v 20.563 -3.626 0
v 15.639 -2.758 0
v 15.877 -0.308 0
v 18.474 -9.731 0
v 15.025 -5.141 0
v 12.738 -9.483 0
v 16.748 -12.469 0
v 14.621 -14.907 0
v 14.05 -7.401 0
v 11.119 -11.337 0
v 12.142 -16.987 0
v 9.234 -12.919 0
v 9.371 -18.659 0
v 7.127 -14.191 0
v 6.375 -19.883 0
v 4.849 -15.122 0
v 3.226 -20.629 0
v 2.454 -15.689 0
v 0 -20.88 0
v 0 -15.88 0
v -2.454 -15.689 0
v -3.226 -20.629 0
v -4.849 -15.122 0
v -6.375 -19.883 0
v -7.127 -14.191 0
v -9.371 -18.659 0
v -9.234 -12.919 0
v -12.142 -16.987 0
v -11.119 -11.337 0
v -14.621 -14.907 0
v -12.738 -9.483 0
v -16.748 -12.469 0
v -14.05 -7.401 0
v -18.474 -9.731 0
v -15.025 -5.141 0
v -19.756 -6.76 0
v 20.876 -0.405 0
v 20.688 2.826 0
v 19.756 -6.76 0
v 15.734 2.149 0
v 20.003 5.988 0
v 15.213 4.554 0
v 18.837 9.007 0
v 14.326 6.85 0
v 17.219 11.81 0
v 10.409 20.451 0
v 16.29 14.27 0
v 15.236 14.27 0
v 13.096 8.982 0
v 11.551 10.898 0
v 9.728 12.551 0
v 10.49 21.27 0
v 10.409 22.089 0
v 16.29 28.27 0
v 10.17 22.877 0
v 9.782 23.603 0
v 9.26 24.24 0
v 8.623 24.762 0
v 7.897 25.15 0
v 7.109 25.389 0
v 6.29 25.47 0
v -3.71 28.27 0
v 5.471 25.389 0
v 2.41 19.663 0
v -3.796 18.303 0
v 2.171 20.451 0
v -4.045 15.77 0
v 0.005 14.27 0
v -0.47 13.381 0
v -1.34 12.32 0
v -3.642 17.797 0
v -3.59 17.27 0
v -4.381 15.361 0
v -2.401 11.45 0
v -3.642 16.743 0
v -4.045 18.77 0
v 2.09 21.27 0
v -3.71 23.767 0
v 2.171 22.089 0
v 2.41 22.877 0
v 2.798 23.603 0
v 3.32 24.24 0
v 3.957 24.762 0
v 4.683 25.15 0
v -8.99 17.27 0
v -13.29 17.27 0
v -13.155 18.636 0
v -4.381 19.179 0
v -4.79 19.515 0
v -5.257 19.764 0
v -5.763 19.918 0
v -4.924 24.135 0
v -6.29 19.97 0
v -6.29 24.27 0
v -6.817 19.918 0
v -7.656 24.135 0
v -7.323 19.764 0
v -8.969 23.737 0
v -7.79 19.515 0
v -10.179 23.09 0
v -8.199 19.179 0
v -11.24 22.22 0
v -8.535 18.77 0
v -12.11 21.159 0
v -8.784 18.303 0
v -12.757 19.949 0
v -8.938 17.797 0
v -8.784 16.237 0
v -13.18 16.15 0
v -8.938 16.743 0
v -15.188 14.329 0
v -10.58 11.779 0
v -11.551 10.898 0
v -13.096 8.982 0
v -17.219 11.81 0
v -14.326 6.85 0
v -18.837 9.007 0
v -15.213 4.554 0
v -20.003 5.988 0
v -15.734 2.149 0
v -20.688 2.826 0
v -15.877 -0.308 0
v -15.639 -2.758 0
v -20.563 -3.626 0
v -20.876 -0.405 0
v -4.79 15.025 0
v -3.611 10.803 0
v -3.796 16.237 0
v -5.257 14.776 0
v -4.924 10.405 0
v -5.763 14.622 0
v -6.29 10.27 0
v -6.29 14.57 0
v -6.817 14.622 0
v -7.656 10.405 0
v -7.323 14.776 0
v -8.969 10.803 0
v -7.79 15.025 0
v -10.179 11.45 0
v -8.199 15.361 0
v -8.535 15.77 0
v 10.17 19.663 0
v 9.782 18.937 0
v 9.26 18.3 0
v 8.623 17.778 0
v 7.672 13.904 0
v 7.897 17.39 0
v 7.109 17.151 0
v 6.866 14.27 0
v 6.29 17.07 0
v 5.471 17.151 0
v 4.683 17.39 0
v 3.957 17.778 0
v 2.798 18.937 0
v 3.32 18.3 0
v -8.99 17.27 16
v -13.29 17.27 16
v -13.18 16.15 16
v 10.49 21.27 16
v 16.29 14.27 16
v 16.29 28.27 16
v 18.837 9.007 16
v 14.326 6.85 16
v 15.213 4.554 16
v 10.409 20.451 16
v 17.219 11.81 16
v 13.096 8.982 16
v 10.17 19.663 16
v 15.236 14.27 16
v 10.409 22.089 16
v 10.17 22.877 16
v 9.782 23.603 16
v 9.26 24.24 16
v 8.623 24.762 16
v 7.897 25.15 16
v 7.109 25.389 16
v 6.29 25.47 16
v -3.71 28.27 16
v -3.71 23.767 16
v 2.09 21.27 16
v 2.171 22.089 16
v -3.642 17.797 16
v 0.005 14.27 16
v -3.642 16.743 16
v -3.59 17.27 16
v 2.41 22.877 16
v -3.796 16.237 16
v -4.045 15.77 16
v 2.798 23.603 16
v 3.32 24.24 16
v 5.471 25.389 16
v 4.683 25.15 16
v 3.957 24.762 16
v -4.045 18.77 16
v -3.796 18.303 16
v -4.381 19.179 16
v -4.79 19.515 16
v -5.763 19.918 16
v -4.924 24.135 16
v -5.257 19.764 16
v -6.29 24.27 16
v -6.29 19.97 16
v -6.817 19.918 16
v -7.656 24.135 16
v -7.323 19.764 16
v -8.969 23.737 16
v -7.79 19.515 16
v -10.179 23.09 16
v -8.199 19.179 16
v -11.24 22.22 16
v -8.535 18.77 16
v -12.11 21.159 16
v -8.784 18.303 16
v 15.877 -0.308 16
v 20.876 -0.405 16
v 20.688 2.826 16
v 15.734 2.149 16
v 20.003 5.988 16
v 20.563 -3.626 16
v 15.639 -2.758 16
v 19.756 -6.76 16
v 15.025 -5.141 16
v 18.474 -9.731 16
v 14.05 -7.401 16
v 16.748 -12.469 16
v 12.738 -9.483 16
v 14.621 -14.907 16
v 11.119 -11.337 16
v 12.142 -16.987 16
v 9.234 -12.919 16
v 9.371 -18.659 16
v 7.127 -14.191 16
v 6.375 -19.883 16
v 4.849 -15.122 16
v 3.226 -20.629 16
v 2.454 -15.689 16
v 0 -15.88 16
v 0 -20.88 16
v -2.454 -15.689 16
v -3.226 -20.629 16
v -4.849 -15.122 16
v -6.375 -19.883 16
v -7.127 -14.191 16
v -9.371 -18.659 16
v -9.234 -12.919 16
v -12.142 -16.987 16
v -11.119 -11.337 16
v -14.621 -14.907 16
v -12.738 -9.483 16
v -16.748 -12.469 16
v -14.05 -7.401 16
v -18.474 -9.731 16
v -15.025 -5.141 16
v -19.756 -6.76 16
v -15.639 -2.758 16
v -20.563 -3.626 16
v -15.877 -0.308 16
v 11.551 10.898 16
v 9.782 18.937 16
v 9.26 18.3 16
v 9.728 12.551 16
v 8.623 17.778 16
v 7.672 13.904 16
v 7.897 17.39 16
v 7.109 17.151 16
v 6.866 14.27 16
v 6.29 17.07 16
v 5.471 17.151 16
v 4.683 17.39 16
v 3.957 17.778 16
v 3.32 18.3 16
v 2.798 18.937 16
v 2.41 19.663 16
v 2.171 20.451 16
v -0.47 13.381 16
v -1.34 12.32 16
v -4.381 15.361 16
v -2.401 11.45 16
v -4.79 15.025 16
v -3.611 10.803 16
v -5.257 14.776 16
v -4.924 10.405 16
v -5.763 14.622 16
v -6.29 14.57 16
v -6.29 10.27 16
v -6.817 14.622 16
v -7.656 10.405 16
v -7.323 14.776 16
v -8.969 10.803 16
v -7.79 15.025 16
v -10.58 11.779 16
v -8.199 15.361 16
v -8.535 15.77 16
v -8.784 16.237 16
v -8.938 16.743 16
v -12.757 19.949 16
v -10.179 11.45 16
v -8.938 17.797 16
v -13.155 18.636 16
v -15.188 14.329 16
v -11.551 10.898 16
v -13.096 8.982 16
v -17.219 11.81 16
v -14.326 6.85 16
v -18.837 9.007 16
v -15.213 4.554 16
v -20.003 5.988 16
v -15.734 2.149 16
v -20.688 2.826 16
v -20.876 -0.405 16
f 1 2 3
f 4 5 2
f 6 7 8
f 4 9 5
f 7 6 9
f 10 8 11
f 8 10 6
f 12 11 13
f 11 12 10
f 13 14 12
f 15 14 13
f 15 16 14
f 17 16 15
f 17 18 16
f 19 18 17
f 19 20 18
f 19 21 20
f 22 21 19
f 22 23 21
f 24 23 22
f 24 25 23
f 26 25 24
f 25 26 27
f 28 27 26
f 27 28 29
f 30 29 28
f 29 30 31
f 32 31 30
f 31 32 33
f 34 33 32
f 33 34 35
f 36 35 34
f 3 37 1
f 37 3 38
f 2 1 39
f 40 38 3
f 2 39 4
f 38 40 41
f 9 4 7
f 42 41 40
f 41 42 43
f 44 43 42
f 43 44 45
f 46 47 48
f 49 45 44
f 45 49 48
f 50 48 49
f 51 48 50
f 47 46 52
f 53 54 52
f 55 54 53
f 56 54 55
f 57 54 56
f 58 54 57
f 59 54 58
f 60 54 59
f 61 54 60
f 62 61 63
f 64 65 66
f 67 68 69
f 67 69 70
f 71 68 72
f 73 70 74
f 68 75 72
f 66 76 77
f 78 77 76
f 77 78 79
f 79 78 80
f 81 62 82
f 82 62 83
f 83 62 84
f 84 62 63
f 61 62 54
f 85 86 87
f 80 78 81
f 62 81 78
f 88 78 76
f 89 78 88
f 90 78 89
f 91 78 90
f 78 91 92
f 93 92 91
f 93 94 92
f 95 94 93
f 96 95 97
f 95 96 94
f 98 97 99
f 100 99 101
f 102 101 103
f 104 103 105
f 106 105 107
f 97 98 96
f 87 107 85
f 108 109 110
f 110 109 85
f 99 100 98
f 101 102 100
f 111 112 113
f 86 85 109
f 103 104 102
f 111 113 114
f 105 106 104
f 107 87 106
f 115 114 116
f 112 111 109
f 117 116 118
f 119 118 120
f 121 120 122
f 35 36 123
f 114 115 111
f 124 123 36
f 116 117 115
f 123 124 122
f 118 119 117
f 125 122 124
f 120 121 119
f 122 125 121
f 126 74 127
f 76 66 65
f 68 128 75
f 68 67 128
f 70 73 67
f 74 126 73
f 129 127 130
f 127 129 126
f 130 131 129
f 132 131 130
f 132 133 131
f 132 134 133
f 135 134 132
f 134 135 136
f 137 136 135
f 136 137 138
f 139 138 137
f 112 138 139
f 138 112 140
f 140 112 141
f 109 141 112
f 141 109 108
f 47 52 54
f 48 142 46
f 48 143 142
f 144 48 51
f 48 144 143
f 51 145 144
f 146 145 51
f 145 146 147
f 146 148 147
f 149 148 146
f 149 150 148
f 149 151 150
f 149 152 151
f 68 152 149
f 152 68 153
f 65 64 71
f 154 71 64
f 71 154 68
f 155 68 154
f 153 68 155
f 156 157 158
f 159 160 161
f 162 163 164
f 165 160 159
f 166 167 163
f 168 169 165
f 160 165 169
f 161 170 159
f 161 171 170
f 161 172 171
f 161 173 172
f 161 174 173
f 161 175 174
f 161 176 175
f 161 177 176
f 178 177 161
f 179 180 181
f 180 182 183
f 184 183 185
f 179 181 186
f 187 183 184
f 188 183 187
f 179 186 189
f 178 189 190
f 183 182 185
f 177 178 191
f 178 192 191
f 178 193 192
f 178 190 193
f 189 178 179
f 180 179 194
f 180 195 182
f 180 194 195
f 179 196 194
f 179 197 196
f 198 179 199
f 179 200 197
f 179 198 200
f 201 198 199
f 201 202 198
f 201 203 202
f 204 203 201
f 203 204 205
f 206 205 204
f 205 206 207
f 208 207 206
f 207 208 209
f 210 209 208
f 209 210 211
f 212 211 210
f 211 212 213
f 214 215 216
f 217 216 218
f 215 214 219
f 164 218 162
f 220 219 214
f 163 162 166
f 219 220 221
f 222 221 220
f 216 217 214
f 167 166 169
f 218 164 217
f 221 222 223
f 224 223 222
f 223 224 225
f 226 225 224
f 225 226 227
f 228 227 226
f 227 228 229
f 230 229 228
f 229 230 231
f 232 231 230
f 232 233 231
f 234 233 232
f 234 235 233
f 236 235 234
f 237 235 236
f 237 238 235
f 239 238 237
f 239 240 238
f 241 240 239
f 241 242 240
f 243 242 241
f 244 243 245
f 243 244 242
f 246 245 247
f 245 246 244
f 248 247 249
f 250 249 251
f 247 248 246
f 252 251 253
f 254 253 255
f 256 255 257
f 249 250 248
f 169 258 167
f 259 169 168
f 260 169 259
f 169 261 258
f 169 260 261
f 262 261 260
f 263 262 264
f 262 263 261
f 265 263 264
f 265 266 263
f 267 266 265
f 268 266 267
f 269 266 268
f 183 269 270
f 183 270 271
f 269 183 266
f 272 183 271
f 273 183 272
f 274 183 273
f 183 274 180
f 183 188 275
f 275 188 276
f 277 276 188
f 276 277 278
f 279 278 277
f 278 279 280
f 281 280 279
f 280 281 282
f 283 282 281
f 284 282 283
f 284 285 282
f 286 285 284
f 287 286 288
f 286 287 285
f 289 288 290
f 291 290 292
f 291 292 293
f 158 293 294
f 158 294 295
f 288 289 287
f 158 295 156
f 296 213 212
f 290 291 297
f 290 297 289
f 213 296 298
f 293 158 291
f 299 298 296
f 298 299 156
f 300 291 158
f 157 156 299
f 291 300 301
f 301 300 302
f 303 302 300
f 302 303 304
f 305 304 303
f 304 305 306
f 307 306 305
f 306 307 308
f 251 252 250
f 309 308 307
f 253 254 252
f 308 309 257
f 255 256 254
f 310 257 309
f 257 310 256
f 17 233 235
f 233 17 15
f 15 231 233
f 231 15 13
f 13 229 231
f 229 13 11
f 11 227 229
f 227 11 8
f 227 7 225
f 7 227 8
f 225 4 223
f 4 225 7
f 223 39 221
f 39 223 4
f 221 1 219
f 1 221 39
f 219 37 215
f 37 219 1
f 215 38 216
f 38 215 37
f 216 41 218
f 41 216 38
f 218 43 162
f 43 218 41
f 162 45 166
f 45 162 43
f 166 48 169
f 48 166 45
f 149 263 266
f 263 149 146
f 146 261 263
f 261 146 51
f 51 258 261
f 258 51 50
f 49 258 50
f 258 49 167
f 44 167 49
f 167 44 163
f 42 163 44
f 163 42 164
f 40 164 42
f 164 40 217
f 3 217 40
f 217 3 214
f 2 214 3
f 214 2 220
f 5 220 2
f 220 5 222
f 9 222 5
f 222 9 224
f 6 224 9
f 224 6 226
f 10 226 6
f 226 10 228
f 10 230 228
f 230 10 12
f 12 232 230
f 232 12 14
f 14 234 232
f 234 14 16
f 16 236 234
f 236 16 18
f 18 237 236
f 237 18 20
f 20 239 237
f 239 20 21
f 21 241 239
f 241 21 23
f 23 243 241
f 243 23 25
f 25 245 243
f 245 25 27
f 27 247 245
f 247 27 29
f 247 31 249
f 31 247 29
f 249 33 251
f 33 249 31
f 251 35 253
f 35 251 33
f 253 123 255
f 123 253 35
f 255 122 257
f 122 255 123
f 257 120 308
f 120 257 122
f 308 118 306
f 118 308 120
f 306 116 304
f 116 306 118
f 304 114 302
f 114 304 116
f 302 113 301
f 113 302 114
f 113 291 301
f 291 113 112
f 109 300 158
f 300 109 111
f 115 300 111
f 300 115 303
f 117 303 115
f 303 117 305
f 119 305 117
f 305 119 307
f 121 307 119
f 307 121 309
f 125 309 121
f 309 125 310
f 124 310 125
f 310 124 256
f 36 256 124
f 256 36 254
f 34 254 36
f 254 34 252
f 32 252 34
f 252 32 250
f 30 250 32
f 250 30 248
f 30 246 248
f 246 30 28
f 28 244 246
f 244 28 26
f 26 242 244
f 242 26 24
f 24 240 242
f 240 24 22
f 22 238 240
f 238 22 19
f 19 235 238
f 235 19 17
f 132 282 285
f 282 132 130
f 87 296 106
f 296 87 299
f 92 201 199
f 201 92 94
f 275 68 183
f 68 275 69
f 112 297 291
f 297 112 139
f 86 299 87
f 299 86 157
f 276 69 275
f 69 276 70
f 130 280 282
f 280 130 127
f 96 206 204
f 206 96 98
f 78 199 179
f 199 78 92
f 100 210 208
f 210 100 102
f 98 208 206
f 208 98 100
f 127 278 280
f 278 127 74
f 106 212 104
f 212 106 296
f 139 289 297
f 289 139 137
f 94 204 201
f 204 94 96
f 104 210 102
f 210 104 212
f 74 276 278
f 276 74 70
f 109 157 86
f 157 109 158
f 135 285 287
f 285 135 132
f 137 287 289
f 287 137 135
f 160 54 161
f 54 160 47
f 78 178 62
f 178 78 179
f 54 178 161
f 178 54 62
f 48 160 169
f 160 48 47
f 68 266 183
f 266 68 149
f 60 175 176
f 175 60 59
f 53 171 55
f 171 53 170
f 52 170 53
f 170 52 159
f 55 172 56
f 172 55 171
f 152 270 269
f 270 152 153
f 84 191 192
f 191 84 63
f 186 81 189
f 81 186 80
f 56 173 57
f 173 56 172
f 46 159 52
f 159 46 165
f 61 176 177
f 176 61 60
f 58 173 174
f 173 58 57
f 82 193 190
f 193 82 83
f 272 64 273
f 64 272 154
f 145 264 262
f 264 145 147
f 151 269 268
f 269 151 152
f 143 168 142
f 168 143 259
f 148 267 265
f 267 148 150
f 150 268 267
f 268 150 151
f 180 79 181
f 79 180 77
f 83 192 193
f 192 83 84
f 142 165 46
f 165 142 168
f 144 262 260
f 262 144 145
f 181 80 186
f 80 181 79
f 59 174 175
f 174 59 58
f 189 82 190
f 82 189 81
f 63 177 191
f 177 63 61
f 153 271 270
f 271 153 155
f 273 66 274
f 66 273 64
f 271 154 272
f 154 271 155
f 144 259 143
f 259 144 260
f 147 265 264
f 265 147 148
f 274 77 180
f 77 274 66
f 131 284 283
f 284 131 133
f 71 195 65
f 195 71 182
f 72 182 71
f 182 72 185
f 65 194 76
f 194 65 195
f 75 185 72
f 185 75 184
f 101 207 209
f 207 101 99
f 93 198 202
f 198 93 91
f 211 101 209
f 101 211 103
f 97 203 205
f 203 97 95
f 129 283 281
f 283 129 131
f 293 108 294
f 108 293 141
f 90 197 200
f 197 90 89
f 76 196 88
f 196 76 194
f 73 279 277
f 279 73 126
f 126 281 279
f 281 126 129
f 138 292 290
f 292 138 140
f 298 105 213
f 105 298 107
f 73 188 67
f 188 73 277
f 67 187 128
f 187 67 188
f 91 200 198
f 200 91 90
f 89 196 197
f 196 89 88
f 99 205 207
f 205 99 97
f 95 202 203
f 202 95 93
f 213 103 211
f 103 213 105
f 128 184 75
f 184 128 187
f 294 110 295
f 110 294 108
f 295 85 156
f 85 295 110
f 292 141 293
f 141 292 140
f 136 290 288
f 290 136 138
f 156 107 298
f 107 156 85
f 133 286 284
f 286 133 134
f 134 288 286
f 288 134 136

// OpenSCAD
$fn = 32;

// ----------------------------------------------------------------------
// Pipe clamp: 41.76 mm ring, 5 mm wall, 16 mm wide
// ----------------------------------------------------------------------

// --- parameters (mm) ---
outer_r = 20.88;          // clamp outside radius
inner_r = 15.88;          // pipe bore radius
band = 5;                 // band thickness
clamp_w = 16;             // clamp width
opening = 40;             // opening angle between the ends
lug_w = 20;               // lug width
lug_len = 14;             // lug length
bolt_d = 8.4;             // bolt hole
knuckle_d = 14;           // hinge knuckle diameter
pin_d = 5.4;              // hinge pin hole

clamp_profile = [[-7.141, 19.621], [-10.087, 18.282], [-12.791, 16.503], [-15.188, 14.329], [-17.219, 11.81], [-18.837, 9.007], [-20.003, 5.988], [-20.688, 2.826], [-20.876, -0.405], [-20.563, -3.626], [-19.756, -6.76], [-18.474, -9.731], [-16.748, -12.469], [-14.621, -14.907], [-12.142, -16.987], [-9.371, -18.659], [-6.375, -19.883], [-3.226, -20.629], [0, -20.88], [3.226, -20.629], [6.375, -19.883], [9.371, -18.659], [12.142, -16.987], [14.621, -14.907], [16.748, -12.469], [18.474, -9.731], [19.756, -6.76], [20.563, -3.626], [20.876, -0.405], [20.688, 2.826], [20.003, 5.988], [18.837, 9.007], [17.219, 11.81], [15.188, 14.329], [12.791, 16.503], [10.087, 18.282], [7.141, 19.621], [5.431, 14.922], [7.672, 13.904], [9.728, 12.551], [11.551, 10.898], [13.096, 8.982], [14.326, 6.85], [15.213, 4.554], [15.734, 2.149], [15.877, -0.308], [15.639, -2.758], [15.025, -5.141], [14.05, -7.401], [12.738, -9.483], [11.119, -11.337], [9.234, -12.919], [7.127, -14.191], [4.849, -15.122], [2.454, -15.689], [0, -15.88], [-2.454, -15.689], [-4.849, -15.122], [-7.127, -14.191], [-9.234, -12.919], [-11.119, -11.337], [-12.738, -9.483], [-14.05, -7.401], [-15.025, -5.141], [-15.639, -2.758], [-15.877, -0.308], [-15.734, 2.149], [-15.213, 4.554], [-14.326, 6.85], [-13.096, 8.982], [-11.551, 10.898], [-9.728, 12.551], [-7.672, 13.904], [-5.431, 14.922]];

difference() {
  union() {
    linear_extrude(height = clamp_w) polygon(clamp_profile);
    /* hinge knuckle, sunk 2 mm into the band end */
    translate([-6.29, 17.27, 0]) cylinder(h = clamp_w, d = knuckle_d);
    /* bolt lug on the other end */
    translate([-3.71, 14.27, 0]) cube([lug_w, 14, clamp_w]);
  }
  translate([6.29, 21.27, -2.5]) cylinder(h = clamp_w + 5, d = bolt_d);
  translate([-6.29, 17.27, -2.5]) cylinder(h = clamp_w + 5, d = pin_d);
}
